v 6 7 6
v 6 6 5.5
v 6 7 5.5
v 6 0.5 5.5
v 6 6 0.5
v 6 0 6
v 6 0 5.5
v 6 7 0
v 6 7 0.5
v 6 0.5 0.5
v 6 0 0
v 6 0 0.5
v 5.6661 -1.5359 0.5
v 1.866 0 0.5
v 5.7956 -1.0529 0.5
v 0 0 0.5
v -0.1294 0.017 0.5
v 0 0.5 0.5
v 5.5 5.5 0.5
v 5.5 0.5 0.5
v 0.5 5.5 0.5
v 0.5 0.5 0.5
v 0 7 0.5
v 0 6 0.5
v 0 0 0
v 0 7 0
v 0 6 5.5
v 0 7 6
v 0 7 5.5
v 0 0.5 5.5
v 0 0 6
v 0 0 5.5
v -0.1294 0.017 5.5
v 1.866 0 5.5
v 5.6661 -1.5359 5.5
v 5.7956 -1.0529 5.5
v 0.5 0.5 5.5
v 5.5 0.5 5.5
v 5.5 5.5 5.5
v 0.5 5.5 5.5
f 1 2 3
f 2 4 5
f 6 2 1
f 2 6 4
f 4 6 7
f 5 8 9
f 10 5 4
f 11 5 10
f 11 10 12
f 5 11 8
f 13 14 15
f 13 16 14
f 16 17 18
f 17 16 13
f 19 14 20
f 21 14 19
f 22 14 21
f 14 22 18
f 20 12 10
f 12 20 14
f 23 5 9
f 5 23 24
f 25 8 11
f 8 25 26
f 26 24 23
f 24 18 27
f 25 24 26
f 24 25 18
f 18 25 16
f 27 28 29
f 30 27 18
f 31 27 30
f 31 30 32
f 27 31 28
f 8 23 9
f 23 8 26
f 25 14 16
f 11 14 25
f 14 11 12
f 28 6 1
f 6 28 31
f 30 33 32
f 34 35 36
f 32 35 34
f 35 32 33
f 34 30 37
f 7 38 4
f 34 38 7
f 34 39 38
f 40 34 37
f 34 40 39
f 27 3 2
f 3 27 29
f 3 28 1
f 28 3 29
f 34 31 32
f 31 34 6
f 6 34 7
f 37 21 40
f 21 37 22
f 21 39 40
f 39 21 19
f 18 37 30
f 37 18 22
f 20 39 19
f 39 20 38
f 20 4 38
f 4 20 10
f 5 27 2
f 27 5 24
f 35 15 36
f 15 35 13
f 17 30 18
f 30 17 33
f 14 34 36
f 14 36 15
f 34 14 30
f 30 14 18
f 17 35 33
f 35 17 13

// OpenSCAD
function sorted(arr) = !(len(arr)>0) ? [] : let(
    pivot   = arr[floor(len(arr)/2)],
    lesser  = [ for (y = arr) if (y  < pivot) y ],
    equal   = [ for (y = arr) if (y == pivot) y ],
    greater = [ for (y = arr) if (y  > pivot) y ]
) concat(
    sorted(lesser), equal, sorted(greater)
);

module ccube(dimensions) {
    ds = sorted(dimensions);
    echo(ds.y, ds.z, 1, "// thickness", ds.x);
    cube(dimensions);
}

module topbottom(dimensions, thickness, back_inset) {
    ccube([dimensions.x + (thickness * 2), dimensions.y + (thickness * 2) + back_inset, thickness]);
}

module side(dimensions, thickness) {
    ccube([thickness, dimensions.y, dimensions.z]);
}

module frontback(dimensions, thickness) {
    ccube([dimensions.x + (thickness * 2), thickness, dimensions.z]);
}

module box(dimensions, thickness, back_inset=0) {    
    translate([0, 0, 0]);
    topbottom(dimensions, thickness, back_inset);
    
    translate([0, 0, dimensions.z + thickness])
    topbottom(dimensions, thickness, back_inset);
    
    translate([0, thickness, thickness])
    side(dimensions, thickness);

    translate([dimensions.x + thickness, thickness, thickness])
    side(dimensions, thickness);
    
    translate([0, dimensions.y + thickness, thickness])
    frontback(dimensions, thickness);
    
    translate([0, thickness, thickness])
    rotate([0, 0, -15])
    mirror([0, 1, 0])
    frontback(dimensions, thickness);
}

box([5, 5, 5], 0.5, 1);
